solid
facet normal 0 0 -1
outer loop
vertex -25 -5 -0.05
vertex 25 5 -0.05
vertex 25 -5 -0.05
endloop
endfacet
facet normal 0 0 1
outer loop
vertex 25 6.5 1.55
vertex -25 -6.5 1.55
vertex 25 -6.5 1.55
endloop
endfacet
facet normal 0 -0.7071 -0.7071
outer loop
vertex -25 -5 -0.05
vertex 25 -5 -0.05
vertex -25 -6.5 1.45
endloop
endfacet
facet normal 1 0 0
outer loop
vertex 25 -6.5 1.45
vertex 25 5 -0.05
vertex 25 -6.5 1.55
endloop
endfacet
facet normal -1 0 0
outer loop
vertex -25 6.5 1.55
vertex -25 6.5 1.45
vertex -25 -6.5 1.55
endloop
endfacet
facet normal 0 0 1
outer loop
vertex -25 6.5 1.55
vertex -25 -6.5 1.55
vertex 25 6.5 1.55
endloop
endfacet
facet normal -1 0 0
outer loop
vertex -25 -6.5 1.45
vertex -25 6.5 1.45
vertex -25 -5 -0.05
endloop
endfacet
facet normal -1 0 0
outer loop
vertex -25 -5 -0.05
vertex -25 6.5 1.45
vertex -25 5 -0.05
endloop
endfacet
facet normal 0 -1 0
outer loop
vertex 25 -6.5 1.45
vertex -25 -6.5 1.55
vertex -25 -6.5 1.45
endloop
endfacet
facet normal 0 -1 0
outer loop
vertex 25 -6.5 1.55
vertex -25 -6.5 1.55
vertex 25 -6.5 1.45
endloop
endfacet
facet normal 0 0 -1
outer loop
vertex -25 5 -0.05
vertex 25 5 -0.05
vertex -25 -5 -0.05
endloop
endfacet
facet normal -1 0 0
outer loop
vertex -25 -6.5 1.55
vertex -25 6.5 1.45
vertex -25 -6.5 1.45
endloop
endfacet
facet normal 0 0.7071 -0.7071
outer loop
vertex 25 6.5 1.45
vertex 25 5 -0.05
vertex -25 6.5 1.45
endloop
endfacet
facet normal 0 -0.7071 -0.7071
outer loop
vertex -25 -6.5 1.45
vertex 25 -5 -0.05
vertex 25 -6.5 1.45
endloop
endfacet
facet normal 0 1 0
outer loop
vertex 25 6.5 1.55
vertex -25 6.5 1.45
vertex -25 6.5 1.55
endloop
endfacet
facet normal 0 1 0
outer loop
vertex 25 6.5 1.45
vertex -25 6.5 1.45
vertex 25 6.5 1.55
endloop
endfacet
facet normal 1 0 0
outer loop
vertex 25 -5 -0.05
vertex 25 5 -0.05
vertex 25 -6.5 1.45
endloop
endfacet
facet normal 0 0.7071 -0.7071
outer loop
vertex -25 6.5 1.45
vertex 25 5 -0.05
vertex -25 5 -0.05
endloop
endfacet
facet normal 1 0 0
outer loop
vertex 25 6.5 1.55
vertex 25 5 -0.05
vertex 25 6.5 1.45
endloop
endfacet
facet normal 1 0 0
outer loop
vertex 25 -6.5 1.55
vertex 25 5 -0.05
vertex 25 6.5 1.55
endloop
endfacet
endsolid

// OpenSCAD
// Layer (with filds) to cover the original belt buckle.
// Shape designed to fit a particular bucklle.
// Top surface will fit Pentomino bbuckle (file 2-pentominos-or-frame.scad)
//
//                                    fold      |                |
//  =====_================_=====      --->      '================'

module base() {
    scale([10, 10, 0.3])
    linear_extrude(height=1) import("belt-base-a.dxf"); 

    translate([0, 0, 0.3])
    scale([10, 10, 0.3])
    linear_extrude(height=1) import("belt-base-b.dxf");

    scale([10, 10, .8])
    linear_extrude(height=1) import("belt-base-e.dxf");
}



module grip(length) {
    height = 1.5;
    hull() {
        translate([0, 0, height])
        rotate([0, 90, 0])
        scale([1, 1, length])
        cube([0.1,10 + height*2,1], true);

        translate([0, 0, 0])
        rotate([0, 90, 0])
        scale([1, 1, length])
        cube([0.1,10,1], true);
    }
}

module top() {
    grip(50);
    thickness = 1.1;
    recess = 1;

    thickness = 4;
    recess = 1;
    
    translate([-78.582/2*1.07, 76.159/2*1.07, 0])
    rotate([180, 0, 0])
    scale([1.07, 1.07, 1])
    {
        difference() {
            scale([10, 10, thickness])
            linear_extrude(height=1) import("belt-base-e2.dxf");

            scale([10, 10, thickness+1])
            linear_extrude(height=1) import("belt-base-cd.dxf");

            translate([0, 0, thickness -recess +.001])
            scale([10, 10, 1])
            linear_extrude(height=1) import("belt-base-cd2.dxf");
        }
        
            //translate([0, 0, 3.5])
            scale([10, 10, recess/2])
            linear_extrude(height=1) import("belt-base-e2.dxf");    
    }
}

if(0)
base();

//translate([80, 0, 0])
{
top();
}
